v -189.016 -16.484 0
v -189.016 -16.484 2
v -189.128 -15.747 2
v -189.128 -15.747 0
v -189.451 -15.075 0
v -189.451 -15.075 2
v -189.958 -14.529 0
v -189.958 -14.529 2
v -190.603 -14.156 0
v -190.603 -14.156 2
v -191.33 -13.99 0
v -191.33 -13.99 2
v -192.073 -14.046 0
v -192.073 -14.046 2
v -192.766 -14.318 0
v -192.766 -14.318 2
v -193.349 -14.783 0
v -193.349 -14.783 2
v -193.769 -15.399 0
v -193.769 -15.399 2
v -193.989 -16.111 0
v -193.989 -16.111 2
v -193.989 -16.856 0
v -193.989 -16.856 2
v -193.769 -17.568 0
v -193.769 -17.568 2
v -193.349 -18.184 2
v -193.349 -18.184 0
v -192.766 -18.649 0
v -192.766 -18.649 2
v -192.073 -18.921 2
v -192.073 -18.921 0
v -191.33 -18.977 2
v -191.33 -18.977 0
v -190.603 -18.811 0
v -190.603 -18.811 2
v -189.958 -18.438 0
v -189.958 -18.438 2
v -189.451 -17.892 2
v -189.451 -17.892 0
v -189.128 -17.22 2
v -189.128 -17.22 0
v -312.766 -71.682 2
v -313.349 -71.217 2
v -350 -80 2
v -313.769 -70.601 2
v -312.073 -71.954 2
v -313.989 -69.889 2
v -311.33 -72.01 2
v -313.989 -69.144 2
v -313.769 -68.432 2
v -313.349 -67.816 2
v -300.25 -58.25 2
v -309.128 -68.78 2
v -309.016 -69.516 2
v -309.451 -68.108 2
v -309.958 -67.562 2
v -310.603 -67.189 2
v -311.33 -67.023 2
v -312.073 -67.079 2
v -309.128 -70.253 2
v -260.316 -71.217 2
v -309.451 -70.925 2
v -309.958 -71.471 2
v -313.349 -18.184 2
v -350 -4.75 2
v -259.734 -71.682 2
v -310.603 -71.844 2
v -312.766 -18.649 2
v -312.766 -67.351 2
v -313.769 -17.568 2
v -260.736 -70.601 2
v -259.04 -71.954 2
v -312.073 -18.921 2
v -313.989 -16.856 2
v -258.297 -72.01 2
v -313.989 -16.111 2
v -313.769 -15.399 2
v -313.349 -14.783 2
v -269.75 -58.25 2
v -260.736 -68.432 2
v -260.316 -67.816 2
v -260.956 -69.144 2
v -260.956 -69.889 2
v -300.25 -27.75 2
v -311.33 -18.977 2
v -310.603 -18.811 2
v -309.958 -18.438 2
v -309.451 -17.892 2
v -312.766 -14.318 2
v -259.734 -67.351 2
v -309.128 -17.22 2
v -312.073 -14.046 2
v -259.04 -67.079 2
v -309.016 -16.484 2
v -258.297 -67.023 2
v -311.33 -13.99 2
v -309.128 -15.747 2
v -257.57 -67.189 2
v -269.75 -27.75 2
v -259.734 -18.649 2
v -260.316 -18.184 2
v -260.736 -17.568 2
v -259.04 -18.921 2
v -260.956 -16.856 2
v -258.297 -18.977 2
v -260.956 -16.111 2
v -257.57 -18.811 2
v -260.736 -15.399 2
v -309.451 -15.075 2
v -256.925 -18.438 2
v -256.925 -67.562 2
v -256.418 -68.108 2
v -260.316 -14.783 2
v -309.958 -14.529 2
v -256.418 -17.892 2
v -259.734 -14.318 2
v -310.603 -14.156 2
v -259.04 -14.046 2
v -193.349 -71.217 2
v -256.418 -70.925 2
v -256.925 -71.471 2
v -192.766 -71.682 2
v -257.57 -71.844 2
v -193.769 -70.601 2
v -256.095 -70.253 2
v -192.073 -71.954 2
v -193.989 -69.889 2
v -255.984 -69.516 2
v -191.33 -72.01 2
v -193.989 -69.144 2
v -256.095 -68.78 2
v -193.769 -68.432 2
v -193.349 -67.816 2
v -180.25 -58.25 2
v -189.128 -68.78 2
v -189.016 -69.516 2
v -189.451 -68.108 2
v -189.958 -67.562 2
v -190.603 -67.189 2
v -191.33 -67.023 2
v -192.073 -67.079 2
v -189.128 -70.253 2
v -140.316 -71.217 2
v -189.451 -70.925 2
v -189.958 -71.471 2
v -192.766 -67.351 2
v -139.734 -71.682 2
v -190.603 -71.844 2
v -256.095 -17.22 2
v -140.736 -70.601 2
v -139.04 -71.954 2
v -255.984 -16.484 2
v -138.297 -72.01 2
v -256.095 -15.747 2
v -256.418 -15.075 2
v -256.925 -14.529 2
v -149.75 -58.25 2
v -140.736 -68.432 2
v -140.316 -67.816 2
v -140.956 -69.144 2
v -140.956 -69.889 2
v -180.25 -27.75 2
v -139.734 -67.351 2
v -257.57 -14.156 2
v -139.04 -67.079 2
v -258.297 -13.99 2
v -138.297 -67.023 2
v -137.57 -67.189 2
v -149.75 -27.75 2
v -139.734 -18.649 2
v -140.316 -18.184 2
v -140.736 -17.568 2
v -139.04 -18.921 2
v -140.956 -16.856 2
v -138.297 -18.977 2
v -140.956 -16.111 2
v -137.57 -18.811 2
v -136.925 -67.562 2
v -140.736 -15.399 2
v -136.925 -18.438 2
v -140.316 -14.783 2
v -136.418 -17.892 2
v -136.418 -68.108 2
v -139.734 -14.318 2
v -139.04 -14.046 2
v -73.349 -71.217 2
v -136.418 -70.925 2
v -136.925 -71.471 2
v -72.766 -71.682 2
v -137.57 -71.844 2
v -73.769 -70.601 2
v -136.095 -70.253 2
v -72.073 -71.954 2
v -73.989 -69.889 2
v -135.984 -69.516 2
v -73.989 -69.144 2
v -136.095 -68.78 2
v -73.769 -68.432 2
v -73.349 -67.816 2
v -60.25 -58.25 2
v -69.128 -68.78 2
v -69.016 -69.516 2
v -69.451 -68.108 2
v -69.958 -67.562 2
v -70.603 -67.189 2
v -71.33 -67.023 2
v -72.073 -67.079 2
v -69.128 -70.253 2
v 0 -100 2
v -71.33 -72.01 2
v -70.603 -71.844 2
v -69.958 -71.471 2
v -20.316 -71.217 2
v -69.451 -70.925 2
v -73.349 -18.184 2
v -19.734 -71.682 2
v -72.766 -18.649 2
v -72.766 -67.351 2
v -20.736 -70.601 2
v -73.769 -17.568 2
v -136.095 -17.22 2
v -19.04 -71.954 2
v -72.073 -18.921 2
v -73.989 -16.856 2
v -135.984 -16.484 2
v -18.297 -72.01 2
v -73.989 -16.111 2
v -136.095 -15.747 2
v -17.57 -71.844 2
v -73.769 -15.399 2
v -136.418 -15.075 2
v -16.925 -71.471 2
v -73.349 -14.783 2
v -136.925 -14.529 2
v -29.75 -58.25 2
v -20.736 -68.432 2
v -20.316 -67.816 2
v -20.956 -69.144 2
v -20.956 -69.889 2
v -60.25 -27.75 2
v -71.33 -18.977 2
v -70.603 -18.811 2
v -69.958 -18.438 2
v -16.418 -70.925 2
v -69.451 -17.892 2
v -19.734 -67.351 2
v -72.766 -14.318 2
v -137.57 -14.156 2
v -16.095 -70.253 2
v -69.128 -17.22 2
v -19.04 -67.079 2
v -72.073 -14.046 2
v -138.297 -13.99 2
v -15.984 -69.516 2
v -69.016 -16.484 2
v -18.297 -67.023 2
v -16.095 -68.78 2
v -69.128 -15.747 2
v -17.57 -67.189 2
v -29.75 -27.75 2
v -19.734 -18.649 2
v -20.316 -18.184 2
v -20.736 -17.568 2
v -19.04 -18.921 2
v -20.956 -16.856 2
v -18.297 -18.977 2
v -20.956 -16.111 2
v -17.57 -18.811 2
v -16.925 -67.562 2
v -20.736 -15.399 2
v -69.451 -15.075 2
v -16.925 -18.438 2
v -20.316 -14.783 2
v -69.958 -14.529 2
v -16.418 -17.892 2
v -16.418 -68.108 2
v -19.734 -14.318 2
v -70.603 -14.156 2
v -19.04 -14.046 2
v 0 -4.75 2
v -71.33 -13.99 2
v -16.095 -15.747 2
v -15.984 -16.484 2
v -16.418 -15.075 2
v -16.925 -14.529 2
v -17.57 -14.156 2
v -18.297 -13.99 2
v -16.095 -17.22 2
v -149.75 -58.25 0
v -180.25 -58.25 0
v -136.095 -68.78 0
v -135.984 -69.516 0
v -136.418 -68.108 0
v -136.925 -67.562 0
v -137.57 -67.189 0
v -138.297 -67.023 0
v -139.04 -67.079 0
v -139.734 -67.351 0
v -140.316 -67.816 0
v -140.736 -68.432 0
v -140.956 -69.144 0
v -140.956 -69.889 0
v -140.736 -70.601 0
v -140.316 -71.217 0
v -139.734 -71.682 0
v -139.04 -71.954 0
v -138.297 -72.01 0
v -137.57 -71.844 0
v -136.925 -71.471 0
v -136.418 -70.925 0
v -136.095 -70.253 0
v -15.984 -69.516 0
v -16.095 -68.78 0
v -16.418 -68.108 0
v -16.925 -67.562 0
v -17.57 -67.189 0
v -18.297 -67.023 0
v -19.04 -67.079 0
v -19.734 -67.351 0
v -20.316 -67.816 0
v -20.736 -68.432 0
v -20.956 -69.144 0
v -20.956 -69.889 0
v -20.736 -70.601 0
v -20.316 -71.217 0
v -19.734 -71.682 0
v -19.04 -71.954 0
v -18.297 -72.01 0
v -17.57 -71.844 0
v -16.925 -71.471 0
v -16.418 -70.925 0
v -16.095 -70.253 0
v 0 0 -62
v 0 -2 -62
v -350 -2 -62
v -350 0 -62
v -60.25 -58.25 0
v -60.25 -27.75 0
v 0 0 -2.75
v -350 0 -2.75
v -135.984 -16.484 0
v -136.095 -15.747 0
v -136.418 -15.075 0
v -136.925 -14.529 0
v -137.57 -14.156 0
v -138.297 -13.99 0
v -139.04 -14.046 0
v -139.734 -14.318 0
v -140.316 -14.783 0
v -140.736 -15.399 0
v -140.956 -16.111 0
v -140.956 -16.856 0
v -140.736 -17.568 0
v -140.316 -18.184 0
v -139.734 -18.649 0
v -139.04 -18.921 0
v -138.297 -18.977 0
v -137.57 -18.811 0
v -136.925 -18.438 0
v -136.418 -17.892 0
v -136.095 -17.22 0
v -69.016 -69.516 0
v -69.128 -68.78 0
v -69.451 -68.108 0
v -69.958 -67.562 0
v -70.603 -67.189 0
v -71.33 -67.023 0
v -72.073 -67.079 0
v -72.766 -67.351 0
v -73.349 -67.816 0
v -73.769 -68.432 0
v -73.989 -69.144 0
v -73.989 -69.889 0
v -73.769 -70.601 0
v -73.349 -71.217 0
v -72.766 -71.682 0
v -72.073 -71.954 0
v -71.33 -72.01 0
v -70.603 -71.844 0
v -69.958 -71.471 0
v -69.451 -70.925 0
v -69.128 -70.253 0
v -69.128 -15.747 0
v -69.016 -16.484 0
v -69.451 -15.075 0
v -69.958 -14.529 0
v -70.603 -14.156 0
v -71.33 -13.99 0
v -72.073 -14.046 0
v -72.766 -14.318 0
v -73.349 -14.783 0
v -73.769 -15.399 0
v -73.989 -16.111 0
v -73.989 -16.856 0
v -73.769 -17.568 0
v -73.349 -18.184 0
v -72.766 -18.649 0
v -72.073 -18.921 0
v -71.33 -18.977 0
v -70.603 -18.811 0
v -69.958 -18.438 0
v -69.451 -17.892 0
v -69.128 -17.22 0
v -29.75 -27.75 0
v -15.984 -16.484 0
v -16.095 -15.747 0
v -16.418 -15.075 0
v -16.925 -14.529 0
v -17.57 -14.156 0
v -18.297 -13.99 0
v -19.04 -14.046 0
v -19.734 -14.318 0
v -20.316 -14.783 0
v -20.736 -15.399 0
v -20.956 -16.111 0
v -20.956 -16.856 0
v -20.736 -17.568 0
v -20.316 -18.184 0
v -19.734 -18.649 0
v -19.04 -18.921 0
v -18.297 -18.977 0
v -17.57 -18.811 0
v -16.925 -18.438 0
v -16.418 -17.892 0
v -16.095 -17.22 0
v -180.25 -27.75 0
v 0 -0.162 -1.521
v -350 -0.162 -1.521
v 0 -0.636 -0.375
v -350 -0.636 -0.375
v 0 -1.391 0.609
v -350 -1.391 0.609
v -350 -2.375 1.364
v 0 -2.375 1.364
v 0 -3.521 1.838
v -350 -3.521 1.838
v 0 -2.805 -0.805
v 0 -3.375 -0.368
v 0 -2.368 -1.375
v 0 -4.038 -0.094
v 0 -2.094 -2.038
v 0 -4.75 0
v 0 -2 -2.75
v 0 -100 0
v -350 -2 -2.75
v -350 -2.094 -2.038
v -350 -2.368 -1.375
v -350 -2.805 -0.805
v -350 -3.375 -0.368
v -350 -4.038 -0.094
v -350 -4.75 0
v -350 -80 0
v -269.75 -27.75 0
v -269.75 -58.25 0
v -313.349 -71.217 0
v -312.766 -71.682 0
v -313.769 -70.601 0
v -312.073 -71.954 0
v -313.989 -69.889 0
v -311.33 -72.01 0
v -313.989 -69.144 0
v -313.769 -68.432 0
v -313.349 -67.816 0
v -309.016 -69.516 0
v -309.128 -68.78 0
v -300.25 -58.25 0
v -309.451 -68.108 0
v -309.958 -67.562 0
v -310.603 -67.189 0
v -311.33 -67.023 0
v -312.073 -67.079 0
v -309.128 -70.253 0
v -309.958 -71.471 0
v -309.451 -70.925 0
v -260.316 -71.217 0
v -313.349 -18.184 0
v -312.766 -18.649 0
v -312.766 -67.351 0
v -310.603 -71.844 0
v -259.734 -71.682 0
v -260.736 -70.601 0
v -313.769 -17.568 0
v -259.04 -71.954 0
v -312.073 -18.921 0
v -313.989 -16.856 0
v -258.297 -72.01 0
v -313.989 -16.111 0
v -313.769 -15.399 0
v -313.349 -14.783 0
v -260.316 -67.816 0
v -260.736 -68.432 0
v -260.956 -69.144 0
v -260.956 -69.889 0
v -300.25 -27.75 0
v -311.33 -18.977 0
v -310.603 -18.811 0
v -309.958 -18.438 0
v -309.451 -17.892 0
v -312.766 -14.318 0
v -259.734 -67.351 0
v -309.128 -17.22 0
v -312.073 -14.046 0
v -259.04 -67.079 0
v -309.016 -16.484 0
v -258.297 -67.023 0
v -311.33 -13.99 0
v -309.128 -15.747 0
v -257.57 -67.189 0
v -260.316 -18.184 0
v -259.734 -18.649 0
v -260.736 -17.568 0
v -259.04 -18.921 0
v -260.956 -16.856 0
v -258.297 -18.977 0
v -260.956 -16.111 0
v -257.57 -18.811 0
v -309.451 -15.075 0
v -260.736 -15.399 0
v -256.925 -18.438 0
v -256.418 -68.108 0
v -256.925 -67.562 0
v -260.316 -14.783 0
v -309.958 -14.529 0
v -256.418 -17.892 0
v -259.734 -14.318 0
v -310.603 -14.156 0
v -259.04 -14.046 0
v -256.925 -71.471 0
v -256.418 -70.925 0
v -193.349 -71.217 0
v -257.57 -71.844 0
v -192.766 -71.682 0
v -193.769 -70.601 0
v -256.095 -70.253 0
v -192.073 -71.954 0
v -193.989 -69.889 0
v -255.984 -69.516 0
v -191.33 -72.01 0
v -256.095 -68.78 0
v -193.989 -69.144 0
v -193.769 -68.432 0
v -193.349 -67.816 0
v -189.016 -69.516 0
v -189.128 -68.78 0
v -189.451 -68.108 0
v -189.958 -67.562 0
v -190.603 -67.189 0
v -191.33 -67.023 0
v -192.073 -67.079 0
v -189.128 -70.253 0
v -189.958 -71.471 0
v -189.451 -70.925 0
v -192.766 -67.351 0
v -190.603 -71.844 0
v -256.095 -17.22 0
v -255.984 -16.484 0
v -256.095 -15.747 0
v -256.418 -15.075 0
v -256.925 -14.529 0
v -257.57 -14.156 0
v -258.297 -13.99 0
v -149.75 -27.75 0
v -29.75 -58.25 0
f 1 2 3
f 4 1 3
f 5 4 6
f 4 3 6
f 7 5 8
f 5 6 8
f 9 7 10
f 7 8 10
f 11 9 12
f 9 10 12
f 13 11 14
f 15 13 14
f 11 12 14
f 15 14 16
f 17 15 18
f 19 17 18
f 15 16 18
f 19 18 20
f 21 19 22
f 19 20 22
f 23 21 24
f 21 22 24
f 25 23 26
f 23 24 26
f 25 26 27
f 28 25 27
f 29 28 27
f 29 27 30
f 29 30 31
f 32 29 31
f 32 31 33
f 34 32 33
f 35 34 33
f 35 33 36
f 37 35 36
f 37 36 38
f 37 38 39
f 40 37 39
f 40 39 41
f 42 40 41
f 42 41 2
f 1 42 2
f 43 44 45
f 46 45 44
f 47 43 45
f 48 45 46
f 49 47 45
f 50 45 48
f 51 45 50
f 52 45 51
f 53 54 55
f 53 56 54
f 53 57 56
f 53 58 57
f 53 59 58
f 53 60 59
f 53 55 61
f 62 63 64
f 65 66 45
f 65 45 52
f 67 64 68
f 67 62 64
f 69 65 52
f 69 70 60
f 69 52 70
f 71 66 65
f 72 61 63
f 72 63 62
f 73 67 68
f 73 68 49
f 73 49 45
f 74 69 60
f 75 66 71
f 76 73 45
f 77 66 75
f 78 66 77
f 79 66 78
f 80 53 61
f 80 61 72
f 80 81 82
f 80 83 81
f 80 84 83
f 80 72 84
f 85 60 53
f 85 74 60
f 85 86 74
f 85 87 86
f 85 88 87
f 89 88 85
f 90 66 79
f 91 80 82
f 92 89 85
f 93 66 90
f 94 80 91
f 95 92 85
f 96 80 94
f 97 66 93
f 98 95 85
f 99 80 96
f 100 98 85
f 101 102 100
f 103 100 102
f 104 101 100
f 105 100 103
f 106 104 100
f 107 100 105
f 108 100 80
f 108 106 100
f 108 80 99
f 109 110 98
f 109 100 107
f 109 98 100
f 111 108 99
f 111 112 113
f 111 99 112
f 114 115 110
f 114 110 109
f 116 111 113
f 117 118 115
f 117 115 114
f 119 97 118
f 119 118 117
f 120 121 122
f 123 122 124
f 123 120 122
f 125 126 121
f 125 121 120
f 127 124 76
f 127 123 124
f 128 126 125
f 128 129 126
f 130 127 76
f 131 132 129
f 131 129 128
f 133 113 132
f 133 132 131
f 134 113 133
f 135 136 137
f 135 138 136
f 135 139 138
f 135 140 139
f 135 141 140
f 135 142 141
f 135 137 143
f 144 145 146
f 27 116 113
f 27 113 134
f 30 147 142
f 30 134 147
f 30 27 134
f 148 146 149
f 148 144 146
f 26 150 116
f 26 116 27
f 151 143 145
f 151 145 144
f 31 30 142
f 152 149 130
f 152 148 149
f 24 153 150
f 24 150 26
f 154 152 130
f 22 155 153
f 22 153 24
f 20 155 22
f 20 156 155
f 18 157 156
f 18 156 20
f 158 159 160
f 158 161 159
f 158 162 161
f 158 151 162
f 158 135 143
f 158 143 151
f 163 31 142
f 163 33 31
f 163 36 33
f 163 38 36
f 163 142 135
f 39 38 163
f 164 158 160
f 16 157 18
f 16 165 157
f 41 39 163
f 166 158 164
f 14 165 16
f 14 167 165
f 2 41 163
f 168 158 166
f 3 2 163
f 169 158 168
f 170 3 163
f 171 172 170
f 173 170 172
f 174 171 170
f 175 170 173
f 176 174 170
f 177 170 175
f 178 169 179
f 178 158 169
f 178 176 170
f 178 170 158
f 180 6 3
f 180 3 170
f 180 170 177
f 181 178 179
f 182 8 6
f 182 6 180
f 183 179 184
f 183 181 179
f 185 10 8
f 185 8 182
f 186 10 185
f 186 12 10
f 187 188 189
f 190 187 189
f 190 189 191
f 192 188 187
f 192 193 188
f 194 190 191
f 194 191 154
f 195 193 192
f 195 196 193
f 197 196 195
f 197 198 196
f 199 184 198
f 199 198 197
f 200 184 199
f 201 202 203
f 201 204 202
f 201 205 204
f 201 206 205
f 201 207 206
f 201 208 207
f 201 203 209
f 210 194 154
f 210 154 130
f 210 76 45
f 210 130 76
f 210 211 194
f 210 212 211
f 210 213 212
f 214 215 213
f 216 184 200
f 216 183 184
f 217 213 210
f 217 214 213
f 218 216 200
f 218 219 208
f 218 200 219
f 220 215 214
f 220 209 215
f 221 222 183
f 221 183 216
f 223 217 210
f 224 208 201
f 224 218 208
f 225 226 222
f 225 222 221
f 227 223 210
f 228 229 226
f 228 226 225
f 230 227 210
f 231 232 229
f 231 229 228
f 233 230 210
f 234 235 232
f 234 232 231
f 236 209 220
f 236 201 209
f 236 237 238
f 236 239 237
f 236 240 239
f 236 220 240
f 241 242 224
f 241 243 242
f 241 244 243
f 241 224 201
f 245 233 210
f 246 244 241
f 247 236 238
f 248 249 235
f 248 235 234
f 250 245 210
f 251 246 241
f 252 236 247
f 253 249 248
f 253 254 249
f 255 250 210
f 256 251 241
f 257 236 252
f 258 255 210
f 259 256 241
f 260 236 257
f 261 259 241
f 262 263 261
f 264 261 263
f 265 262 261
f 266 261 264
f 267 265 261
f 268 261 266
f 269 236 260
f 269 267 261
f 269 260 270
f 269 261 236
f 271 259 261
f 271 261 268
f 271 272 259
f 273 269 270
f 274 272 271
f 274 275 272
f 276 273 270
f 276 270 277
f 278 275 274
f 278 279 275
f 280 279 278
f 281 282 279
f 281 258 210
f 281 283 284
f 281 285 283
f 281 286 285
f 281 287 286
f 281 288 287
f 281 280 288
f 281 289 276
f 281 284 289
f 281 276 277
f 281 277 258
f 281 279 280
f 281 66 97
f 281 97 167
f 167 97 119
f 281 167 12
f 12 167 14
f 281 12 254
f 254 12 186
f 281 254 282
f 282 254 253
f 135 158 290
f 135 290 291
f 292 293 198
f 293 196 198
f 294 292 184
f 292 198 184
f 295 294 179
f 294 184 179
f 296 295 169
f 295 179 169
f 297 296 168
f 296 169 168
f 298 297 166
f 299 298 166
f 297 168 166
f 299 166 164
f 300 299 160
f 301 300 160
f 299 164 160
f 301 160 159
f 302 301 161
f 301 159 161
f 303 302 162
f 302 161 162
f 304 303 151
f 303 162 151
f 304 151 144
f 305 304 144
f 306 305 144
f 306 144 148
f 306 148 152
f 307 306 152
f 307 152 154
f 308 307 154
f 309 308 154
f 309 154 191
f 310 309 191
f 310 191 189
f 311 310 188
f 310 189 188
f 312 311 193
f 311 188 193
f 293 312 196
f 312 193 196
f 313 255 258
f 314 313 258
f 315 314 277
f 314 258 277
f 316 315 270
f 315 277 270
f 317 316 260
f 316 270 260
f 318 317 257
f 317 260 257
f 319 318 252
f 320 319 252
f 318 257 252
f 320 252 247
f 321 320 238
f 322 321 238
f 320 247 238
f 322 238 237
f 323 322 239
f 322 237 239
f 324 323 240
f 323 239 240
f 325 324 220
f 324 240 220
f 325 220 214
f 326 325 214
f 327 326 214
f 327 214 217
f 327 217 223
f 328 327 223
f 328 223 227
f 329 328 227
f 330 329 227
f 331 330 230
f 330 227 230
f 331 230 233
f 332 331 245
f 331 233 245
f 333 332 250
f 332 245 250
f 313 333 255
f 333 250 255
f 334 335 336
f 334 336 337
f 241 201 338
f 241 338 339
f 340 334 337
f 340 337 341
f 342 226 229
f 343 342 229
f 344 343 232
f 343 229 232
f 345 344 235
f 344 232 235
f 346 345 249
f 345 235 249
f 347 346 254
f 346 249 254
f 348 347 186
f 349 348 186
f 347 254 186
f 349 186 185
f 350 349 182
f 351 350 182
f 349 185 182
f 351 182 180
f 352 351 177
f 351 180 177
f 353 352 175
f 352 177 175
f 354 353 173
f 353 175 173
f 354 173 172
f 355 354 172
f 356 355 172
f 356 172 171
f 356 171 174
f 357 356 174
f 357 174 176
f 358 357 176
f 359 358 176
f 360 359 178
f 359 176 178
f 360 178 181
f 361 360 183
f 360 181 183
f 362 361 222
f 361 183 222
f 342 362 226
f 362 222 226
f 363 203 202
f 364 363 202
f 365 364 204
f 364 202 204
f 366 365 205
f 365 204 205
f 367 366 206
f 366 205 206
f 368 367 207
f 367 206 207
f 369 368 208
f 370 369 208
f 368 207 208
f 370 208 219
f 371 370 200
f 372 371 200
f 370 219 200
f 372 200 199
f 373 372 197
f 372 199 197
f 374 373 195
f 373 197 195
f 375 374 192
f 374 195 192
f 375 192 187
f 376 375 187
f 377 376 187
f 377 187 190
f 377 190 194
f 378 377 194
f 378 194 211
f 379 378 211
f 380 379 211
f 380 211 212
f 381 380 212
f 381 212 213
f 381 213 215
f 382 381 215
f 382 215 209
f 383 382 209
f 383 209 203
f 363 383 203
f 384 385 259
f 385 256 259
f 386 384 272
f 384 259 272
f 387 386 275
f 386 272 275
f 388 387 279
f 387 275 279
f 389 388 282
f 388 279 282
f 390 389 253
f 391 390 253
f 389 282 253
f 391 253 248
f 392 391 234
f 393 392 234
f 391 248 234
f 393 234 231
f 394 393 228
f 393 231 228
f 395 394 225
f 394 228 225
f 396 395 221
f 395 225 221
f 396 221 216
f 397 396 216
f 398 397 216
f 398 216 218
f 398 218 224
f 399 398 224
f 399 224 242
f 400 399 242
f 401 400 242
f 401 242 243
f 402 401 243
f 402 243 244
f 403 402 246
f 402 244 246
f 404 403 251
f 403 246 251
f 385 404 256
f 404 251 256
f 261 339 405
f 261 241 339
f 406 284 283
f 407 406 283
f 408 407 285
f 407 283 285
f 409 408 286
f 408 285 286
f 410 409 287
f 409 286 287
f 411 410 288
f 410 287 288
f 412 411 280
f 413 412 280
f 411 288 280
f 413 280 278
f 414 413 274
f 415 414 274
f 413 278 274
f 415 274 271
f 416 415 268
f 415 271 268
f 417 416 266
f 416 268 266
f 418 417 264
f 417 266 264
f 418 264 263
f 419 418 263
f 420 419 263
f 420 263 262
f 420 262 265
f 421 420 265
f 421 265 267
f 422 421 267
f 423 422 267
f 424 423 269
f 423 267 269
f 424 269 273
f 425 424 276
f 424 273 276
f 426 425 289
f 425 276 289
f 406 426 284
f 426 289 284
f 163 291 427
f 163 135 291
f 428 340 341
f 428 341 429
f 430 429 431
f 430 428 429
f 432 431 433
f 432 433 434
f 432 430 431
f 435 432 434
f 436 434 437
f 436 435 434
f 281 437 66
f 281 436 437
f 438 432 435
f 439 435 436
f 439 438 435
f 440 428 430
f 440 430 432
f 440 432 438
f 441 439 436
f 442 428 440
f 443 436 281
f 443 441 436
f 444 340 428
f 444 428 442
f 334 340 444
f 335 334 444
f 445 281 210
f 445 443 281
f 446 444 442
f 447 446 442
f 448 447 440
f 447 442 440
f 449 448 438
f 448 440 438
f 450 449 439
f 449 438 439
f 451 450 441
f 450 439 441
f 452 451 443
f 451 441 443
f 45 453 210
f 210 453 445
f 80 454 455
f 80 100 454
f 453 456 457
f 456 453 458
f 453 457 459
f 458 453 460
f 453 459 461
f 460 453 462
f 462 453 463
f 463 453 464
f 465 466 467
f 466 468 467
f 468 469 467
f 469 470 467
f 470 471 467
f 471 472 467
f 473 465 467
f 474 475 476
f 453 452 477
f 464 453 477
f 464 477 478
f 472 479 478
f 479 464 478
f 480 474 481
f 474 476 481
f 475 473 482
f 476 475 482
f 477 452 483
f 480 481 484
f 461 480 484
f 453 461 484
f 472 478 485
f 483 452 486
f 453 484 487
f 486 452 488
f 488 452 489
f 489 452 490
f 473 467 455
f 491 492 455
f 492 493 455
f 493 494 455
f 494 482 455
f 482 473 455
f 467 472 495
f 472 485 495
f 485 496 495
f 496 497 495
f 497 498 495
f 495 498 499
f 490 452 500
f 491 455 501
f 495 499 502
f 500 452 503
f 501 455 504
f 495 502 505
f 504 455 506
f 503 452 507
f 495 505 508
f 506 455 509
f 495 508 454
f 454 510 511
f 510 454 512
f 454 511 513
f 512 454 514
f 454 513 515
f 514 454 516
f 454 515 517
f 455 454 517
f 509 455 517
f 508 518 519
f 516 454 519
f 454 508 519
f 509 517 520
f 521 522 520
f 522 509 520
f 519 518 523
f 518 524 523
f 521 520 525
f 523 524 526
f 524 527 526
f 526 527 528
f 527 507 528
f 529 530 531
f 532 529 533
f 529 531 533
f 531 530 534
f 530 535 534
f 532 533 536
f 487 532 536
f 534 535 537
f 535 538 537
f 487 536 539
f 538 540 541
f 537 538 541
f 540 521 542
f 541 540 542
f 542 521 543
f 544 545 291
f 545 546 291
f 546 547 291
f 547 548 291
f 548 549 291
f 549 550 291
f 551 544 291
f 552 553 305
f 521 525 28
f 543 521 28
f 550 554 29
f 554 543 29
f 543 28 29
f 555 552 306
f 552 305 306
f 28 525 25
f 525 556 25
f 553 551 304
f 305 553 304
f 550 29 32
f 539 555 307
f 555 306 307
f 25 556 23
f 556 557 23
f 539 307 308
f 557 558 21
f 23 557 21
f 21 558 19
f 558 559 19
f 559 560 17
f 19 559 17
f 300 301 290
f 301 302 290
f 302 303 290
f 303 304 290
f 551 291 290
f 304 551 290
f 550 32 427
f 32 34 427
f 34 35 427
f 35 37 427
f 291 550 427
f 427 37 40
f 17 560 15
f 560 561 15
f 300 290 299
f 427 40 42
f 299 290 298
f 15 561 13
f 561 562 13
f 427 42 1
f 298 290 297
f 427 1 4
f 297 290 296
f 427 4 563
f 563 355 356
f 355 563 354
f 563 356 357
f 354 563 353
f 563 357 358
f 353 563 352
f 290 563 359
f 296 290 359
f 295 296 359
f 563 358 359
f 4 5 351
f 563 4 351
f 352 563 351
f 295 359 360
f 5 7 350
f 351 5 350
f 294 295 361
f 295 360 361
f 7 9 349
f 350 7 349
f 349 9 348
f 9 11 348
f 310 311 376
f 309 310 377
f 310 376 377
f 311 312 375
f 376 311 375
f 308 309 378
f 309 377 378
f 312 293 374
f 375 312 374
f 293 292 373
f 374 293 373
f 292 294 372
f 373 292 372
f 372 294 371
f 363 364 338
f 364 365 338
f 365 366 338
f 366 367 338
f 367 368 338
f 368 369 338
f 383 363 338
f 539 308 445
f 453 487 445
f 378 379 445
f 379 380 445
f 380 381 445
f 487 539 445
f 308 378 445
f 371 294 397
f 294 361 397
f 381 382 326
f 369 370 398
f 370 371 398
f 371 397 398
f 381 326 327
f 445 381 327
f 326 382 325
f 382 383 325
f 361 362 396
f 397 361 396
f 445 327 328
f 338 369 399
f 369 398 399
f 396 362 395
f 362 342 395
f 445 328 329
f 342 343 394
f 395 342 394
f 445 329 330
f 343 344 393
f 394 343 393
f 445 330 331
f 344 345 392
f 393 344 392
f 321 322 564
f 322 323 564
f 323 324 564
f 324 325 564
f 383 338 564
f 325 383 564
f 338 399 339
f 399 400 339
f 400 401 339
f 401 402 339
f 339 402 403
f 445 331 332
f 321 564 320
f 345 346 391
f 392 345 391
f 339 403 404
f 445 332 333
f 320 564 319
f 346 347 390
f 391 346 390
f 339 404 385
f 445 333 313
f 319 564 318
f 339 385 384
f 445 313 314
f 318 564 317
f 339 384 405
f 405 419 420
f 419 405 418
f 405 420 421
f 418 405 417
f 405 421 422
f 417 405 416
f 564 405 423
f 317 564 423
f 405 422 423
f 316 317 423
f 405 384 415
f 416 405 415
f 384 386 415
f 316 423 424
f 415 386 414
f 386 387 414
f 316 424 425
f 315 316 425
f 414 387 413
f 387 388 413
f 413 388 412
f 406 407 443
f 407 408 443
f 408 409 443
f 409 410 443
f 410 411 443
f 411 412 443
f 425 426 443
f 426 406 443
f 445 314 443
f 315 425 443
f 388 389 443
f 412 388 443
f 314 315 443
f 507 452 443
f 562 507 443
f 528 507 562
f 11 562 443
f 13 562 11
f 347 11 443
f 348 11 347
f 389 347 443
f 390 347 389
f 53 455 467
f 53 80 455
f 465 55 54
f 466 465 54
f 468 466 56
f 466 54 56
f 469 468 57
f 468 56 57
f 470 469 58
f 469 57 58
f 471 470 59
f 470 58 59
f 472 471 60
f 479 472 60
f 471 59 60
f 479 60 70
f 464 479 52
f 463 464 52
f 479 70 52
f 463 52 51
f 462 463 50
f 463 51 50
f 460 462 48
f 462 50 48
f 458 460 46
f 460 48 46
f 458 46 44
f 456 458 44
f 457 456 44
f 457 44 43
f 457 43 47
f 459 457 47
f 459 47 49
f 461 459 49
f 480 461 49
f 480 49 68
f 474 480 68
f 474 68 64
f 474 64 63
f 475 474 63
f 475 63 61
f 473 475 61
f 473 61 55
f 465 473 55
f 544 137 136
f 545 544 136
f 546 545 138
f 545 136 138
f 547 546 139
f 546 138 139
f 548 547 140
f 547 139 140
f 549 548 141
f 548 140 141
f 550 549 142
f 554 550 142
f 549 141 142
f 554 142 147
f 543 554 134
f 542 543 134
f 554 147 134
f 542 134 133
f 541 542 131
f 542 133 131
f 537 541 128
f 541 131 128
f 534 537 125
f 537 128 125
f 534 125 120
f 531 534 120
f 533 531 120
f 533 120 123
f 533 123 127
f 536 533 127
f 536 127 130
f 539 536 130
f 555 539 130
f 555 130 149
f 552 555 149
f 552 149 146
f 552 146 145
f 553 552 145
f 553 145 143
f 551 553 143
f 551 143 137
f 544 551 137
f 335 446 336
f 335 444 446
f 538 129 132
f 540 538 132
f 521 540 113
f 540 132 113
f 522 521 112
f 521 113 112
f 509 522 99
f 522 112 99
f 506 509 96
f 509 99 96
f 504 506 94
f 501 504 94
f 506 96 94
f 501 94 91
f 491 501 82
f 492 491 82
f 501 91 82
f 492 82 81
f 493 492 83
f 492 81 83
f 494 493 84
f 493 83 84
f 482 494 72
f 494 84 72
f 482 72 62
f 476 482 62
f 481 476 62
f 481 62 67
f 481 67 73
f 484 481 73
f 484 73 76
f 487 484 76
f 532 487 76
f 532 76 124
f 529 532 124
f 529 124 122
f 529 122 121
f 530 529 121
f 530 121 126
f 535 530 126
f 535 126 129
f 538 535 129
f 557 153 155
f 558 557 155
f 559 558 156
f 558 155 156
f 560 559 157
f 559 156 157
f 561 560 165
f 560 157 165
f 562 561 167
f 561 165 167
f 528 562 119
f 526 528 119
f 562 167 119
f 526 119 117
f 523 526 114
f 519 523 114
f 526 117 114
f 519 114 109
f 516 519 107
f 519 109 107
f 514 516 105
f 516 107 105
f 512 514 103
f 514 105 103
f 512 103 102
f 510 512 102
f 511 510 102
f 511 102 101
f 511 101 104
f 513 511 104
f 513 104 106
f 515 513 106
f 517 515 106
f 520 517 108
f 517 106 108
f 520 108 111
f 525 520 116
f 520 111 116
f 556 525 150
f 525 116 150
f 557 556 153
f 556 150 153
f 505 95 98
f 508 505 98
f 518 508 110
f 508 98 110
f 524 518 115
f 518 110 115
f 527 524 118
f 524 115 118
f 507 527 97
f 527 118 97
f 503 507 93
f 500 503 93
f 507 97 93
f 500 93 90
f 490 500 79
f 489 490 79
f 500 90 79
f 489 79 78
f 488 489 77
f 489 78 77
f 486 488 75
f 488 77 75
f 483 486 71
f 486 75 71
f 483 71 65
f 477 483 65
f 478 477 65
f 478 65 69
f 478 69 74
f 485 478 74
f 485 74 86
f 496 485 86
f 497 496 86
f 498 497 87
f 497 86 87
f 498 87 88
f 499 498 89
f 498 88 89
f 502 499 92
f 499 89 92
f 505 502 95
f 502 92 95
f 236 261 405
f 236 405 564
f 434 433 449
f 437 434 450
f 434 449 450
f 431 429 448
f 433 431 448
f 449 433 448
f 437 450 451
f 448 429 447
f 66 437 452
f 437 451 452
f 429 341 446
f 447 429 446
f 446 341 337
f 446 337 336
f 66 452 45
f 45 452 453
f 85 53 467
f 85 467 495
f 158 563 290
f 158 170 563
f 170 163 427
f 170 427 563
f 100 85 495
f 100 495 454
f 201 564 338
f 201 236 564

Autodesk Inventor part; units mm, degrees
ref_plane "YZ Plane" through (0, 0, 0) normal (1, 0, 0) x (0, 1, 0)
ref_plane "XZ Plane" through (0, 0, 0) normal (0, 1, 0) x (-1, 0, 0)
ref_plane "XY Plane" through (0, 0, 0) normal (0, 0, 1) x (1, 0, 0)
sketch "Sketch1" plane through (0, 0, 0) normal (0, 0, 1) x (1, 0, 0)
  line L0 (0, 0) -> (-350, 0)
  line L1 (0, -100) -> (0, 0)
  line L2 (-350, 0) -> (-350, -80)
  line L3 (-350, -80) -> (0, -100)
  point P0 (0, -50)
  dimension "d32" = 100
  dimension "d60" = 80
  dimension "d61" = 350
extrude "Plate1" add sketch "Sketch1" along normal blind 2
sketch "Sketch8" plane through (0, 0, 2) normal (0, 0, 1) x (1, 0, 0)
  line L0 (-29.75, -58.25) -> (-60.25, -58.25)
  line L1 (-60.25, -58.25) -> (-60.25, -27.75)
  line L2 (-60.25, -27.75) -> (-29.75, -27.75)
  line L3 (-29.75, -27.75) -> (-29.75, -58.25)
  line L4 (-29.75, -58.25) -> (-60.25, -27.75) construction
  line L5 (-60.25, -58.25) -> (-29.75, -27.75) construction
  circle A0 centre (-18.4835, -69.5165) radius 2.5
  circle A1 centre (-71.5165, -69.5165) radius 2.5
  circle A2 centre (-71.5165, -16.4835) radius 2.5
  circle A3 centre (-18.4835, -16.4835) radius 2.5
  circle A4 centre (-45, -43) radius 37.5 construction
  line L6 (0, 0) -> (0, -100) projected
  line L7 (-350, 0) -> (0, 0) projected
  line L8 (-60.25, -58.25) -> (-71.5165, -69.5165) construction
  dimension "d51" = 30.5
  dimension "d52" = 30.5
  dimension "d53" = 5
  dimension "d72" = 45
  dimension "d73" = 43
  dimension "d74" = 15.9332
  dimension "d75" = 75
extrude "Cut3" cut sketch "Sketch8" against normal blind 2
pattern_linear "Rectangular Pattern1" count 3 spacing 120 along (-1, 0, 0) of "Cut3"
sketch "Sketch9" plane through (0, -2, 2) normal (0, 1, 0) x (-1, 0, 0)
  line L0 (350, 0) -> (0, 0)
  line L1 (0, 0) -> (0, -64)
  line L2 (0, -64) -> (350, -64)
  line L3 (350, -64) -> (350, 0)
edge flange "Flange3" height 64 angle 90 thickness 2 bend radius 2.75 thickness toward (0, 1, 0) relief round relief width 2 relief depth 1 edges at (-175, 0, 0) wall of the first edge with corners at (-350, -2, 2) (0, -2, 2) (0, -2, -62) (-350, -2, -62)
bend "Bend3"
corner "Corner3"
equation "\"d32\" = Main_way_hight"
equation "\"d51\" = d52"
equation "\"d55\" = Thickness"
equation "\"d2\" = Thickness"
equation "\"d62\" = BendReliefWidth"
equation "\"d63\" = BendReliefDepth"
equation "\"d64\" = MinimumRemnant"
equation "\"d65\" = TransitionRadius"
equation "\"d66\" = MAIN_7_central_window_width + 2 * Thickness"
equation "\"d68\" = BendRadius"
equation "\"d69\" = CornerReliefSize"
equation "\"d70\" = GapSize"
equation "\"d71\" = JacobiRadiusSize"
equation "\"BendReliefWidth\" = Thickness"
equation "\"BendReliefDepth\" = 0.5 * Thickness"
equation "\"CornerReliefSize\" = 4 * Thickness"
equation "\"MinimumRemnant\" = 2 * Thickness"
equation "\"TransitionRadius\" = BendRadius"
equation "\"JacobiRadiusSize\" = BendRadius"
equation "\"GapSize\" = Thickness"
equation "\"Main_way_hight\" = 100"
equation "\"Thickness\" = 2"
equation "\"MAIN_7_central_window_width\" = 60"
equation "\"BendRadius\" = 2.75"
properties part number "ANP 1422 BOTTOM FDS diameter way up" material "Stainless Steel"
